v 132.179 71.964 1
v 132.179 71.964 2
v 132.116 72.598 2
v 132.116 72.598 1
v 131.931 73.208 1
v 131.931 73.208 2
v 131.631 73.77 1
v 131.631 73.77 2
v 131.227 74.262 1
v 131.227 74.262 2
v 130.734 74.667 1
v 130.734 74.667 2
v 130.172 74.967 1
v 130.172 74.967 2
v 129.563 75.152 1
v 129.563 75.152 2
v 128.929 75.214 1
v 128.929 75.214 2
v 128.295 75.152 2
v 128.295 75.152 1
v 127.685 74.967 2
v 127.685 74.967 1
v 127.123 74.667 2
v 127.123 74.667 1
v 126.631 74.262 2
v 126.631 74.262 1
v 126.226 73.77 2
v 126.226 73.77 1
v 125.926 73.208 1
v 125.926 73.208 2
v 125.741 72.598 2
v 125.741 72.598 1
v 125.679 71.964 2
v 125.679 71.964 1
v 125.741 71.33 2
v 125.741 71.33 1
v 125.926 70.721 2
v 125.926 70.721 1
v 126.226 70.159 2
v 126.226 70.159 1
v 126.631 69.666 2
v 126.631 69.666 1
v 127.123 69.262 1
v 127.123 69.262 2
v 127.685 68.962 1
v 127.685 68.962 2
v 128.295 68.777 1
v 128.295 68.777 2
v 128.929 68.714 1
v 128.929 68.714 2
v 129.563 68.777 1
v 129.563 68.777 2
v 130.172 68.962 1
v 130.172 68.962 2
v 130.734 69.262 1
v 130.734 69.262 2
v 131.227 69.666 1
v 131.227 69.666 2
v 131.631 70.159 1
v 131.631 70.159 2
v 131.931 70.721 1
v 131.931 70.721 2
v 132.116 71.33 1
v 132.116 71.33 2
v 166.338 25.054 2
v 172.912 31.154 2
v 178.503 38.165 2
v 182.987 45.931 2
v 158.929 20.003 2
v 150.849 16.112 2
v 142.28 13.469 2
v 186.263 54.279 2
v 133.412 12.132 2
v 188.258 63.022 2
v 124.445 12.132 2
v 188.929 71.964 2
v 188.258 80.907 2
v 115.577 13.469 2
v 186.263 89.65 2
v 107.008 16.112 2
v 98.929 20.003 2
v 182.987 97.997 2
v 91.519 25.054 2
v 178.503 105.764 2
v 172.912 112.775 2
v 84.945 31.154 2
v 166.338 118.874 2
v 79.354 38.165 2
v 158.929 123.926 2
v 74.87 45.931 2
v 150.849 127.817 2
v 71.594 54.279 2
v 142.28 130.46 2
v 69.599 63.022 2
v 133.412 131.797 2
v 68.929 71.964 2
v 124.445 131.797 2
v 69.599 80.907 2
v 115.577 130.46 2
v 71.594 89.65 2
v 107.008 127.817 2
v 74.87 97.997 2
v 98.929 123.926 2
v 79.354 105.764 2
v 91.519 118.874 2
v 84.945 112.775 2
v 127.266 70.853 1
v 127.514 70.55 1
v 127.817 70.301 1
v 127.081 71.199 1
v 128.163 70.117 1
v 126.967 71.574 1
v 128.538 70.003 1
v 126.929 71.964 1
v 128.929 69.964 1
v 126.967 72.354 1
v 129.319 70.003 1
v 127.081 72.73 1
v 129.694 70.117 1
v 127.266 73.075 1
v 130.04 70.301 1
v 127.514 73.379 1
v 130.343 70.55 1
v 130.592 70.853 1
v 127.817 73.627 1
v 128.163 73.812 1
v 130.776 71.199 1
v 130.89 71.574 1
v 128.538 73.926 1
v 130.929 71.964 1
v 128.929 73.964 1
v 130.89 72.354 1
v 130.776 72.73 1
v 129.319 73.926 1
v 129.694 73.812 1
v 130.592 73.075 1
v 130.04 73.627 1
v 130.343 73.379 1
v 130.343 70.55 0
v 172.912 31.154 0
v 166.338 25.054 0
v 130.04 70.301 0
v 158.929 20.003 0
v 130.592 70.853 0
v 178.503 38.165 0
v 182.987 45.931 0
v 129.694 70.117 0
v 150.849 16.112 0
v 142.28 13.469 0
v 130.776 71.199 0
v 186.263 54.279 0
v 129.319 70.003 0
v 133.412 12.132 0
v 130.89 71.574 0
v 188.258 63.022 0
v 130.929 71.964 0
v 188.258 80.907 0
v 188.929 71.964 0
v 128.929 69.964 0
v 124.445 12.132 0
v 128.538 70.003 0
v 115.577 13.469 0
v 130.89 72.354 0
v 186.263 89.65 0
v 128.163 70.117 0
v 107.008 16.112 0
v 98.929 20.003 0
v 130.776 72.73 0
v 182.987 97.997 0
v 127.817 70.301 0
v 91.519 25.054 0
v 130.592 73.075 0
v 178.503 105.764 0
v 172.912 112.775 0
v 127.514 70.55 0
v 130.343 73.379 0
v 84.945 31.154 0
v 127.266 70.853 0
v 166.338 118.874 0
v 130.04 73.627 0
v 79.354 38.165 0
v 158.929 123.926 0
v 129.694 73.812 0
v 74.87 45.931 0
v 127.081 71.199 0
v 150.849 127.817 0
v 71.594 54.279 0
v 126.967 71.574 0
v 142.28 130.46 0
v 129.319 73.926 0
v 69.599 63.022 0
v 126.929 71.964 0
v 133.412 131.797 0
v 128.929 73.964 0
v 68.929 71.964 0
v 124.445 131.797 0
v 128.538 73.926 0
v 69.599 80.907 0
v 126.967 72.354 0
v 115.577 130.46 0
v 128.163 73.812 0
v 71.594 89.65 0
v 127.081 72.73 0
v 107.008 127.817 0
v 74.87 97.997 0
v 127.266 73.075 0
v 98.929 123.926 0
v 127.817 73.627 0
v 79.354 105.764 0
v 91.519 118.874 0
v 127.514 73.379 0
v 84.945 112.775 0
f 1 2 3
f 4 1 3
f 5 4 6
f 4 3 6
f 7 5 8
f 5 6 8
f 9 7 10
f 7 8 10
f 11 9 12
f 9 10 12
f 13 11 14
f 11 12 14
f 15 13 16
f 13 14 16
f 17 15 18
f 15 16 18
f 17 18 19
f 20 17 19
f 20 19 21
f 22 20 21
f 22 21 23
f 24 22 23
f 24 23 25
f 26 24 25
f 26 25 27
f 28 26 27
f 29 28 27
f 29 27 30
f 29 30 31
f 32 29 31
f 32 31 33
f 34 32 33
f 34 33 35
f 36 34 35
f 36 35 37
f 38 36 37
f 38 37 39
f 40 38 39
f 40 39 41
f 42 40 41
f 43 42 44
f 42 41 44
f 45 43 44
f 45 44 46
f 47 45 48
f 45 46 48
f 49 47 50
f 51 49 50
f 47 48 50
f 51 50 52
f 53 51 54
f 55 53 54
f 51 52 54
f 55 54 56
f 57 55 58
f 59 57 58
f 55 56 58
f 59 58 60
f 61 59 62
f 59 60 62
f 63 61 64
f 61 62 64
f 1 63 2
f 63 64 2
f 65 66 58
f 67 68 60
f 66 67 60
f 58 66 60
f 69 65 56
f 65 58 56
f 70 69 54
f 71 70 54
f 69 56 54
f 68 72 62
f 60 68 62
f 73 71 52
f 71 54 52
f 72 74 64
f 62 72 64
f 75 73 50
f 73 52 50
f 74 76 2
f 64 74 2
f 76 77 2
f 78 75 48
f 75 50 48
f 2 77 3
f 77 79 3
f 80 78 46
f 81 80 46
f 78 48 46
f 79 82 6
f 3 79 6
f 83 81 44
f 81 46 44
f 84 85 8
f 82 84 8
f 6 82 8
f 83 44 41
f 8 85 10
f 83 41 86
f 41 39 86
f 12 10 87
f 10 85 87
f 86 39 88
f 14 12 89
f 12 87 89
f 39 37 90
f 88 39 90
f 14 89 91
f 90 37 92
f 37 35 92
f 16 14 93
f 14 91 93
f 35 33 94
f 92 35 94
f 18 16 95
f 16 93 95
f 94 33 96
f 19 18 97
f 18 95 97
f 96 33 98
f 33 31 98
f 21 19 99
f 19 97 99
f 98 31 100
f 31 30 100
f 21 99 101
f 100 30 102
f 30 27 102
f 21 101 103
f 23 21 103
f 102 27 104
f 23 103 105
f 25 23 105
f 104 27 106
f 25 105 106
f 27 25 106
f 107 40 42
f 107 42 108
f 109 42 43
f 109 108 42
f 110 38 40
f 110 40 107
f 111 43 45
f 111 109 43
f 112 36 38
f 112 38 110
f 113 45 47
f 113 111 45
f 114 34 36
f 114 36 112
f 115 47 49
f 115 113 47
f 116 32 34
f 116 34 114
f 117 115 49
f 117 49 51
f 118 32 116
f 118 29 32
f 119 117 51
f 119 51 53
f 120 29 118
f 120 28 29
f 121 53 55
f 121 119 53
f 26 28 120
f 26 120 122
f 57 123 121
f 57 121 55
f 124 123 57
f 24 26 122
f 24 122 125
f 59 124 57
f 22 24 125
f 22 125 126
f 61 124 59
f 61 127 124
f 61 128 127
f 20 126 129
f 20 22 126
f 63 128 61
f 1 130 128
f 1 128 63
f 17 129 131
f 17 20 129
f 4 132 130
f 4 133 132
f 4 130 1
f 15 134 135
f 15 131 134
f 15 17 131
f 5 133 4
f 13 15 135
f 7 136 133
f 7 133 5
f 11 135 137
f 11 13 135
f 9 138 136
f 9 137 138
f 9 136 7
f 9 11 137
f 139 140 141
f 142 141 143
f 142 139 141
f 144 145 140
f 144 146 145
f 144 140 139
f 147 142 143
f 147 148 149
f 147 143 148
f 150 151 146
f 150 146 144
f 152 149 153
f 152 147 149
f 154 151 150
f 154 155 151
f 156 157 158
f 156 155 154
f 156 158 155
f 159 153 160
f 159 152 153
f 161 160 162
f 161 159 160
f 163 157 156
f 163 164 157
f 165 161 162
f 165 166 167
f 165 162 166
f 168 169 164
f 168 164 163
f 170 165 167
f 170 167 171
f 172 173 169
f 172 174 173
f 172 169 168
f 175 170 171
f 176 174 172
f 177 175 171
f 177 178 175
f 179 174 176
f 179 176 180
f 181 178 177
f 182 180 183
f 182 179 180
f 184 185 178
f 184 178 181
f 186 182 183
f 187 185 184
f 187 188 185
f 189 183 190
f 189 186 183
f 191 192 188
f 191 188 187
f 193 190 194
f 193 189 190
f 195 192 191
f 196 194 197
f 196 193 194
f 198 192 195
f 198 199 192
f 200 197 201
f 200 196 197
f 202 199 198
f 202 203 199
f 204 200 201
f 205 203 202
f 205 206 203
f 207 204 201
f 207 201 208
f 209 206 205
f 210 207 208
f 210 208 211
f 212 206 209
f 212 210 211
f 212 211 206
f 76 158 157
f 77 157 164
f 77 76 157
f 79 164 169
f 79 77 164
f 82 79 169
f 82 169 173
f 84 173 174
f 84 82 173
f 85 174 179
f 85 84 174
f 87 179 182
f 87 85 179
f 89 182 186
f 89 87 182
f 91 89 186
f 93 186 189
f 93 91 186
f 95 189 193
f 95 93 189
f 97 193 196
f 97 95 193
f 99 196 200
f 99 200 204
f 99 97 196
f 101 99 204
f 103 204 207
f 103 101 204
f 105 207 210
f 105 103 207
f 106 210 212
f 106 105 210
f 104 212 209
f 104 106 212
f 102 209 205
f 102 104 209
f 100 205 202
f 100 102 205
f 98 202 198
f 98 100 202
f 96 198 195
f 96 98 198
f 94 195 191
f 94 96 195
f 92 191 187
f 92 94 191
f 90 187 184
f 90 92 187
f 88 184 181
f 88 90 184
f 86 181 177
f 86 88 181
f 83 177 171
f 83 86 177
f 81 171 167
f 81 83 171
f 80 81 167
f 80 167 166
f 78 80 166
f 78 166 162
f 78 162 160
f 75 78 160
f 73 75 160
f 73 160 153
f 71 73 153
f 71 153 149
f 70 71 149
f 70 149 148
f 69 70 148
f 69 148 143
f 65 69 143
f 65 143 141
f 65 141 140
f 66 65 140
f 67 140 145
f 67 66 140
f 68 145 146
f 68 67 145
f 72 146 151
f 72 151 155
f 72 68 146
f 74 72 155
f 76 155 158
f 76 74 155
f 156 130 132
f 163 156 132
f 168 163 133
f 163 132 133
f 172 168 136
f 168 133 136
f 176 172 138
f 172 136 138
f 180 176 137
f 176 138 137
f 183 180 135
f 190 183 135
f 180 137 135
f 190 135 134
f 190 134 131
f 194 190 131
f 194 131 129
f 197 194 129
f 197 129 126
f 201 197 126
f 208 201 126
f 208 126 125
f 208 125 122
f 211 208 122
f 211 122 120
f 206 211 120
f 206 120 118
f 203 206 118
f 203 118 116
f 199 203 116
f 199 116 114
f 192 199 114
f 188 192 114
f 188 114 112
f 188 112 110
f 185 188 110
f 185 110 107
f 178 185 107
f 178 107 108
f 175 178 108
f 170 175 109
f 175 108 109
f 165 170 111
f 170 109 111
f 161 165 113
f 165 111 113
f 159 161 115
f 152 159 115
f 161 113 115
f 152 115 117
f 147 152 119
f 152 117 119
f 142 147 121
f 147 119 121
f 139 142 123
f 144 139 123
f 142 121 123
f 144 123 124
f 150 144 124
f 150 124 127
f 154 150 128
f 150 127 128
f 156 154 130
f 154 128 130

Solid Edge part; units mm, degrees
sketch "Sketch1" plane through (0, 0, 0) normal (0, 0, 1) x (1, 0, 0)
  line L0 (68.9286, 131.9643) -> (188.9286, 131.9643)
  line L1 (188.9286, 131.9643) -> (188.9286, 11.9643)
  line L2 (188.9286, 11.9643) -> (68.9286, 11.9643)
  line L3 (68.9286, 11.9643) -> (68.9286, 131.9643)
  dimension "D1" = 120
  dimension "D2" = 120
  dimension "D3" = 120
extrude "Protrusion1" add sketch "Sketch1" along normal blind 2
sketch "Sketch2" plane through (128.9286, 71.9643, 2) normal (0, 0, 1) x (1, 0, 0)
  circle A0 centre (0, 0) radius 2
  dimension "D1" = 60
  dimension "D2" = 60
  dimension "D3" = 60
extrude "Cutout1" cut sketch "Sketch2" against normal through all
sketch "Sketch3" plane through (128.9286, 71.9643, 2) normal (0, 0, 1) x (1, 0, 0)
  circle A0 centre (0, 0) radius 3.25
extrude "ExtrudedCutout_3" cut sketch "Sketch3" against normal blind 1
sketch "Sketch4" plane through (128.9286, 71.9643, 2) normal (0, 0, 1) x (1, 0, 0)
  circle A0 centre (0, 0) radius 60
  circle A1 centre (0, 0) radius 90
extrude "Cutout2" cut sketch "Sketch4" against normal through all
